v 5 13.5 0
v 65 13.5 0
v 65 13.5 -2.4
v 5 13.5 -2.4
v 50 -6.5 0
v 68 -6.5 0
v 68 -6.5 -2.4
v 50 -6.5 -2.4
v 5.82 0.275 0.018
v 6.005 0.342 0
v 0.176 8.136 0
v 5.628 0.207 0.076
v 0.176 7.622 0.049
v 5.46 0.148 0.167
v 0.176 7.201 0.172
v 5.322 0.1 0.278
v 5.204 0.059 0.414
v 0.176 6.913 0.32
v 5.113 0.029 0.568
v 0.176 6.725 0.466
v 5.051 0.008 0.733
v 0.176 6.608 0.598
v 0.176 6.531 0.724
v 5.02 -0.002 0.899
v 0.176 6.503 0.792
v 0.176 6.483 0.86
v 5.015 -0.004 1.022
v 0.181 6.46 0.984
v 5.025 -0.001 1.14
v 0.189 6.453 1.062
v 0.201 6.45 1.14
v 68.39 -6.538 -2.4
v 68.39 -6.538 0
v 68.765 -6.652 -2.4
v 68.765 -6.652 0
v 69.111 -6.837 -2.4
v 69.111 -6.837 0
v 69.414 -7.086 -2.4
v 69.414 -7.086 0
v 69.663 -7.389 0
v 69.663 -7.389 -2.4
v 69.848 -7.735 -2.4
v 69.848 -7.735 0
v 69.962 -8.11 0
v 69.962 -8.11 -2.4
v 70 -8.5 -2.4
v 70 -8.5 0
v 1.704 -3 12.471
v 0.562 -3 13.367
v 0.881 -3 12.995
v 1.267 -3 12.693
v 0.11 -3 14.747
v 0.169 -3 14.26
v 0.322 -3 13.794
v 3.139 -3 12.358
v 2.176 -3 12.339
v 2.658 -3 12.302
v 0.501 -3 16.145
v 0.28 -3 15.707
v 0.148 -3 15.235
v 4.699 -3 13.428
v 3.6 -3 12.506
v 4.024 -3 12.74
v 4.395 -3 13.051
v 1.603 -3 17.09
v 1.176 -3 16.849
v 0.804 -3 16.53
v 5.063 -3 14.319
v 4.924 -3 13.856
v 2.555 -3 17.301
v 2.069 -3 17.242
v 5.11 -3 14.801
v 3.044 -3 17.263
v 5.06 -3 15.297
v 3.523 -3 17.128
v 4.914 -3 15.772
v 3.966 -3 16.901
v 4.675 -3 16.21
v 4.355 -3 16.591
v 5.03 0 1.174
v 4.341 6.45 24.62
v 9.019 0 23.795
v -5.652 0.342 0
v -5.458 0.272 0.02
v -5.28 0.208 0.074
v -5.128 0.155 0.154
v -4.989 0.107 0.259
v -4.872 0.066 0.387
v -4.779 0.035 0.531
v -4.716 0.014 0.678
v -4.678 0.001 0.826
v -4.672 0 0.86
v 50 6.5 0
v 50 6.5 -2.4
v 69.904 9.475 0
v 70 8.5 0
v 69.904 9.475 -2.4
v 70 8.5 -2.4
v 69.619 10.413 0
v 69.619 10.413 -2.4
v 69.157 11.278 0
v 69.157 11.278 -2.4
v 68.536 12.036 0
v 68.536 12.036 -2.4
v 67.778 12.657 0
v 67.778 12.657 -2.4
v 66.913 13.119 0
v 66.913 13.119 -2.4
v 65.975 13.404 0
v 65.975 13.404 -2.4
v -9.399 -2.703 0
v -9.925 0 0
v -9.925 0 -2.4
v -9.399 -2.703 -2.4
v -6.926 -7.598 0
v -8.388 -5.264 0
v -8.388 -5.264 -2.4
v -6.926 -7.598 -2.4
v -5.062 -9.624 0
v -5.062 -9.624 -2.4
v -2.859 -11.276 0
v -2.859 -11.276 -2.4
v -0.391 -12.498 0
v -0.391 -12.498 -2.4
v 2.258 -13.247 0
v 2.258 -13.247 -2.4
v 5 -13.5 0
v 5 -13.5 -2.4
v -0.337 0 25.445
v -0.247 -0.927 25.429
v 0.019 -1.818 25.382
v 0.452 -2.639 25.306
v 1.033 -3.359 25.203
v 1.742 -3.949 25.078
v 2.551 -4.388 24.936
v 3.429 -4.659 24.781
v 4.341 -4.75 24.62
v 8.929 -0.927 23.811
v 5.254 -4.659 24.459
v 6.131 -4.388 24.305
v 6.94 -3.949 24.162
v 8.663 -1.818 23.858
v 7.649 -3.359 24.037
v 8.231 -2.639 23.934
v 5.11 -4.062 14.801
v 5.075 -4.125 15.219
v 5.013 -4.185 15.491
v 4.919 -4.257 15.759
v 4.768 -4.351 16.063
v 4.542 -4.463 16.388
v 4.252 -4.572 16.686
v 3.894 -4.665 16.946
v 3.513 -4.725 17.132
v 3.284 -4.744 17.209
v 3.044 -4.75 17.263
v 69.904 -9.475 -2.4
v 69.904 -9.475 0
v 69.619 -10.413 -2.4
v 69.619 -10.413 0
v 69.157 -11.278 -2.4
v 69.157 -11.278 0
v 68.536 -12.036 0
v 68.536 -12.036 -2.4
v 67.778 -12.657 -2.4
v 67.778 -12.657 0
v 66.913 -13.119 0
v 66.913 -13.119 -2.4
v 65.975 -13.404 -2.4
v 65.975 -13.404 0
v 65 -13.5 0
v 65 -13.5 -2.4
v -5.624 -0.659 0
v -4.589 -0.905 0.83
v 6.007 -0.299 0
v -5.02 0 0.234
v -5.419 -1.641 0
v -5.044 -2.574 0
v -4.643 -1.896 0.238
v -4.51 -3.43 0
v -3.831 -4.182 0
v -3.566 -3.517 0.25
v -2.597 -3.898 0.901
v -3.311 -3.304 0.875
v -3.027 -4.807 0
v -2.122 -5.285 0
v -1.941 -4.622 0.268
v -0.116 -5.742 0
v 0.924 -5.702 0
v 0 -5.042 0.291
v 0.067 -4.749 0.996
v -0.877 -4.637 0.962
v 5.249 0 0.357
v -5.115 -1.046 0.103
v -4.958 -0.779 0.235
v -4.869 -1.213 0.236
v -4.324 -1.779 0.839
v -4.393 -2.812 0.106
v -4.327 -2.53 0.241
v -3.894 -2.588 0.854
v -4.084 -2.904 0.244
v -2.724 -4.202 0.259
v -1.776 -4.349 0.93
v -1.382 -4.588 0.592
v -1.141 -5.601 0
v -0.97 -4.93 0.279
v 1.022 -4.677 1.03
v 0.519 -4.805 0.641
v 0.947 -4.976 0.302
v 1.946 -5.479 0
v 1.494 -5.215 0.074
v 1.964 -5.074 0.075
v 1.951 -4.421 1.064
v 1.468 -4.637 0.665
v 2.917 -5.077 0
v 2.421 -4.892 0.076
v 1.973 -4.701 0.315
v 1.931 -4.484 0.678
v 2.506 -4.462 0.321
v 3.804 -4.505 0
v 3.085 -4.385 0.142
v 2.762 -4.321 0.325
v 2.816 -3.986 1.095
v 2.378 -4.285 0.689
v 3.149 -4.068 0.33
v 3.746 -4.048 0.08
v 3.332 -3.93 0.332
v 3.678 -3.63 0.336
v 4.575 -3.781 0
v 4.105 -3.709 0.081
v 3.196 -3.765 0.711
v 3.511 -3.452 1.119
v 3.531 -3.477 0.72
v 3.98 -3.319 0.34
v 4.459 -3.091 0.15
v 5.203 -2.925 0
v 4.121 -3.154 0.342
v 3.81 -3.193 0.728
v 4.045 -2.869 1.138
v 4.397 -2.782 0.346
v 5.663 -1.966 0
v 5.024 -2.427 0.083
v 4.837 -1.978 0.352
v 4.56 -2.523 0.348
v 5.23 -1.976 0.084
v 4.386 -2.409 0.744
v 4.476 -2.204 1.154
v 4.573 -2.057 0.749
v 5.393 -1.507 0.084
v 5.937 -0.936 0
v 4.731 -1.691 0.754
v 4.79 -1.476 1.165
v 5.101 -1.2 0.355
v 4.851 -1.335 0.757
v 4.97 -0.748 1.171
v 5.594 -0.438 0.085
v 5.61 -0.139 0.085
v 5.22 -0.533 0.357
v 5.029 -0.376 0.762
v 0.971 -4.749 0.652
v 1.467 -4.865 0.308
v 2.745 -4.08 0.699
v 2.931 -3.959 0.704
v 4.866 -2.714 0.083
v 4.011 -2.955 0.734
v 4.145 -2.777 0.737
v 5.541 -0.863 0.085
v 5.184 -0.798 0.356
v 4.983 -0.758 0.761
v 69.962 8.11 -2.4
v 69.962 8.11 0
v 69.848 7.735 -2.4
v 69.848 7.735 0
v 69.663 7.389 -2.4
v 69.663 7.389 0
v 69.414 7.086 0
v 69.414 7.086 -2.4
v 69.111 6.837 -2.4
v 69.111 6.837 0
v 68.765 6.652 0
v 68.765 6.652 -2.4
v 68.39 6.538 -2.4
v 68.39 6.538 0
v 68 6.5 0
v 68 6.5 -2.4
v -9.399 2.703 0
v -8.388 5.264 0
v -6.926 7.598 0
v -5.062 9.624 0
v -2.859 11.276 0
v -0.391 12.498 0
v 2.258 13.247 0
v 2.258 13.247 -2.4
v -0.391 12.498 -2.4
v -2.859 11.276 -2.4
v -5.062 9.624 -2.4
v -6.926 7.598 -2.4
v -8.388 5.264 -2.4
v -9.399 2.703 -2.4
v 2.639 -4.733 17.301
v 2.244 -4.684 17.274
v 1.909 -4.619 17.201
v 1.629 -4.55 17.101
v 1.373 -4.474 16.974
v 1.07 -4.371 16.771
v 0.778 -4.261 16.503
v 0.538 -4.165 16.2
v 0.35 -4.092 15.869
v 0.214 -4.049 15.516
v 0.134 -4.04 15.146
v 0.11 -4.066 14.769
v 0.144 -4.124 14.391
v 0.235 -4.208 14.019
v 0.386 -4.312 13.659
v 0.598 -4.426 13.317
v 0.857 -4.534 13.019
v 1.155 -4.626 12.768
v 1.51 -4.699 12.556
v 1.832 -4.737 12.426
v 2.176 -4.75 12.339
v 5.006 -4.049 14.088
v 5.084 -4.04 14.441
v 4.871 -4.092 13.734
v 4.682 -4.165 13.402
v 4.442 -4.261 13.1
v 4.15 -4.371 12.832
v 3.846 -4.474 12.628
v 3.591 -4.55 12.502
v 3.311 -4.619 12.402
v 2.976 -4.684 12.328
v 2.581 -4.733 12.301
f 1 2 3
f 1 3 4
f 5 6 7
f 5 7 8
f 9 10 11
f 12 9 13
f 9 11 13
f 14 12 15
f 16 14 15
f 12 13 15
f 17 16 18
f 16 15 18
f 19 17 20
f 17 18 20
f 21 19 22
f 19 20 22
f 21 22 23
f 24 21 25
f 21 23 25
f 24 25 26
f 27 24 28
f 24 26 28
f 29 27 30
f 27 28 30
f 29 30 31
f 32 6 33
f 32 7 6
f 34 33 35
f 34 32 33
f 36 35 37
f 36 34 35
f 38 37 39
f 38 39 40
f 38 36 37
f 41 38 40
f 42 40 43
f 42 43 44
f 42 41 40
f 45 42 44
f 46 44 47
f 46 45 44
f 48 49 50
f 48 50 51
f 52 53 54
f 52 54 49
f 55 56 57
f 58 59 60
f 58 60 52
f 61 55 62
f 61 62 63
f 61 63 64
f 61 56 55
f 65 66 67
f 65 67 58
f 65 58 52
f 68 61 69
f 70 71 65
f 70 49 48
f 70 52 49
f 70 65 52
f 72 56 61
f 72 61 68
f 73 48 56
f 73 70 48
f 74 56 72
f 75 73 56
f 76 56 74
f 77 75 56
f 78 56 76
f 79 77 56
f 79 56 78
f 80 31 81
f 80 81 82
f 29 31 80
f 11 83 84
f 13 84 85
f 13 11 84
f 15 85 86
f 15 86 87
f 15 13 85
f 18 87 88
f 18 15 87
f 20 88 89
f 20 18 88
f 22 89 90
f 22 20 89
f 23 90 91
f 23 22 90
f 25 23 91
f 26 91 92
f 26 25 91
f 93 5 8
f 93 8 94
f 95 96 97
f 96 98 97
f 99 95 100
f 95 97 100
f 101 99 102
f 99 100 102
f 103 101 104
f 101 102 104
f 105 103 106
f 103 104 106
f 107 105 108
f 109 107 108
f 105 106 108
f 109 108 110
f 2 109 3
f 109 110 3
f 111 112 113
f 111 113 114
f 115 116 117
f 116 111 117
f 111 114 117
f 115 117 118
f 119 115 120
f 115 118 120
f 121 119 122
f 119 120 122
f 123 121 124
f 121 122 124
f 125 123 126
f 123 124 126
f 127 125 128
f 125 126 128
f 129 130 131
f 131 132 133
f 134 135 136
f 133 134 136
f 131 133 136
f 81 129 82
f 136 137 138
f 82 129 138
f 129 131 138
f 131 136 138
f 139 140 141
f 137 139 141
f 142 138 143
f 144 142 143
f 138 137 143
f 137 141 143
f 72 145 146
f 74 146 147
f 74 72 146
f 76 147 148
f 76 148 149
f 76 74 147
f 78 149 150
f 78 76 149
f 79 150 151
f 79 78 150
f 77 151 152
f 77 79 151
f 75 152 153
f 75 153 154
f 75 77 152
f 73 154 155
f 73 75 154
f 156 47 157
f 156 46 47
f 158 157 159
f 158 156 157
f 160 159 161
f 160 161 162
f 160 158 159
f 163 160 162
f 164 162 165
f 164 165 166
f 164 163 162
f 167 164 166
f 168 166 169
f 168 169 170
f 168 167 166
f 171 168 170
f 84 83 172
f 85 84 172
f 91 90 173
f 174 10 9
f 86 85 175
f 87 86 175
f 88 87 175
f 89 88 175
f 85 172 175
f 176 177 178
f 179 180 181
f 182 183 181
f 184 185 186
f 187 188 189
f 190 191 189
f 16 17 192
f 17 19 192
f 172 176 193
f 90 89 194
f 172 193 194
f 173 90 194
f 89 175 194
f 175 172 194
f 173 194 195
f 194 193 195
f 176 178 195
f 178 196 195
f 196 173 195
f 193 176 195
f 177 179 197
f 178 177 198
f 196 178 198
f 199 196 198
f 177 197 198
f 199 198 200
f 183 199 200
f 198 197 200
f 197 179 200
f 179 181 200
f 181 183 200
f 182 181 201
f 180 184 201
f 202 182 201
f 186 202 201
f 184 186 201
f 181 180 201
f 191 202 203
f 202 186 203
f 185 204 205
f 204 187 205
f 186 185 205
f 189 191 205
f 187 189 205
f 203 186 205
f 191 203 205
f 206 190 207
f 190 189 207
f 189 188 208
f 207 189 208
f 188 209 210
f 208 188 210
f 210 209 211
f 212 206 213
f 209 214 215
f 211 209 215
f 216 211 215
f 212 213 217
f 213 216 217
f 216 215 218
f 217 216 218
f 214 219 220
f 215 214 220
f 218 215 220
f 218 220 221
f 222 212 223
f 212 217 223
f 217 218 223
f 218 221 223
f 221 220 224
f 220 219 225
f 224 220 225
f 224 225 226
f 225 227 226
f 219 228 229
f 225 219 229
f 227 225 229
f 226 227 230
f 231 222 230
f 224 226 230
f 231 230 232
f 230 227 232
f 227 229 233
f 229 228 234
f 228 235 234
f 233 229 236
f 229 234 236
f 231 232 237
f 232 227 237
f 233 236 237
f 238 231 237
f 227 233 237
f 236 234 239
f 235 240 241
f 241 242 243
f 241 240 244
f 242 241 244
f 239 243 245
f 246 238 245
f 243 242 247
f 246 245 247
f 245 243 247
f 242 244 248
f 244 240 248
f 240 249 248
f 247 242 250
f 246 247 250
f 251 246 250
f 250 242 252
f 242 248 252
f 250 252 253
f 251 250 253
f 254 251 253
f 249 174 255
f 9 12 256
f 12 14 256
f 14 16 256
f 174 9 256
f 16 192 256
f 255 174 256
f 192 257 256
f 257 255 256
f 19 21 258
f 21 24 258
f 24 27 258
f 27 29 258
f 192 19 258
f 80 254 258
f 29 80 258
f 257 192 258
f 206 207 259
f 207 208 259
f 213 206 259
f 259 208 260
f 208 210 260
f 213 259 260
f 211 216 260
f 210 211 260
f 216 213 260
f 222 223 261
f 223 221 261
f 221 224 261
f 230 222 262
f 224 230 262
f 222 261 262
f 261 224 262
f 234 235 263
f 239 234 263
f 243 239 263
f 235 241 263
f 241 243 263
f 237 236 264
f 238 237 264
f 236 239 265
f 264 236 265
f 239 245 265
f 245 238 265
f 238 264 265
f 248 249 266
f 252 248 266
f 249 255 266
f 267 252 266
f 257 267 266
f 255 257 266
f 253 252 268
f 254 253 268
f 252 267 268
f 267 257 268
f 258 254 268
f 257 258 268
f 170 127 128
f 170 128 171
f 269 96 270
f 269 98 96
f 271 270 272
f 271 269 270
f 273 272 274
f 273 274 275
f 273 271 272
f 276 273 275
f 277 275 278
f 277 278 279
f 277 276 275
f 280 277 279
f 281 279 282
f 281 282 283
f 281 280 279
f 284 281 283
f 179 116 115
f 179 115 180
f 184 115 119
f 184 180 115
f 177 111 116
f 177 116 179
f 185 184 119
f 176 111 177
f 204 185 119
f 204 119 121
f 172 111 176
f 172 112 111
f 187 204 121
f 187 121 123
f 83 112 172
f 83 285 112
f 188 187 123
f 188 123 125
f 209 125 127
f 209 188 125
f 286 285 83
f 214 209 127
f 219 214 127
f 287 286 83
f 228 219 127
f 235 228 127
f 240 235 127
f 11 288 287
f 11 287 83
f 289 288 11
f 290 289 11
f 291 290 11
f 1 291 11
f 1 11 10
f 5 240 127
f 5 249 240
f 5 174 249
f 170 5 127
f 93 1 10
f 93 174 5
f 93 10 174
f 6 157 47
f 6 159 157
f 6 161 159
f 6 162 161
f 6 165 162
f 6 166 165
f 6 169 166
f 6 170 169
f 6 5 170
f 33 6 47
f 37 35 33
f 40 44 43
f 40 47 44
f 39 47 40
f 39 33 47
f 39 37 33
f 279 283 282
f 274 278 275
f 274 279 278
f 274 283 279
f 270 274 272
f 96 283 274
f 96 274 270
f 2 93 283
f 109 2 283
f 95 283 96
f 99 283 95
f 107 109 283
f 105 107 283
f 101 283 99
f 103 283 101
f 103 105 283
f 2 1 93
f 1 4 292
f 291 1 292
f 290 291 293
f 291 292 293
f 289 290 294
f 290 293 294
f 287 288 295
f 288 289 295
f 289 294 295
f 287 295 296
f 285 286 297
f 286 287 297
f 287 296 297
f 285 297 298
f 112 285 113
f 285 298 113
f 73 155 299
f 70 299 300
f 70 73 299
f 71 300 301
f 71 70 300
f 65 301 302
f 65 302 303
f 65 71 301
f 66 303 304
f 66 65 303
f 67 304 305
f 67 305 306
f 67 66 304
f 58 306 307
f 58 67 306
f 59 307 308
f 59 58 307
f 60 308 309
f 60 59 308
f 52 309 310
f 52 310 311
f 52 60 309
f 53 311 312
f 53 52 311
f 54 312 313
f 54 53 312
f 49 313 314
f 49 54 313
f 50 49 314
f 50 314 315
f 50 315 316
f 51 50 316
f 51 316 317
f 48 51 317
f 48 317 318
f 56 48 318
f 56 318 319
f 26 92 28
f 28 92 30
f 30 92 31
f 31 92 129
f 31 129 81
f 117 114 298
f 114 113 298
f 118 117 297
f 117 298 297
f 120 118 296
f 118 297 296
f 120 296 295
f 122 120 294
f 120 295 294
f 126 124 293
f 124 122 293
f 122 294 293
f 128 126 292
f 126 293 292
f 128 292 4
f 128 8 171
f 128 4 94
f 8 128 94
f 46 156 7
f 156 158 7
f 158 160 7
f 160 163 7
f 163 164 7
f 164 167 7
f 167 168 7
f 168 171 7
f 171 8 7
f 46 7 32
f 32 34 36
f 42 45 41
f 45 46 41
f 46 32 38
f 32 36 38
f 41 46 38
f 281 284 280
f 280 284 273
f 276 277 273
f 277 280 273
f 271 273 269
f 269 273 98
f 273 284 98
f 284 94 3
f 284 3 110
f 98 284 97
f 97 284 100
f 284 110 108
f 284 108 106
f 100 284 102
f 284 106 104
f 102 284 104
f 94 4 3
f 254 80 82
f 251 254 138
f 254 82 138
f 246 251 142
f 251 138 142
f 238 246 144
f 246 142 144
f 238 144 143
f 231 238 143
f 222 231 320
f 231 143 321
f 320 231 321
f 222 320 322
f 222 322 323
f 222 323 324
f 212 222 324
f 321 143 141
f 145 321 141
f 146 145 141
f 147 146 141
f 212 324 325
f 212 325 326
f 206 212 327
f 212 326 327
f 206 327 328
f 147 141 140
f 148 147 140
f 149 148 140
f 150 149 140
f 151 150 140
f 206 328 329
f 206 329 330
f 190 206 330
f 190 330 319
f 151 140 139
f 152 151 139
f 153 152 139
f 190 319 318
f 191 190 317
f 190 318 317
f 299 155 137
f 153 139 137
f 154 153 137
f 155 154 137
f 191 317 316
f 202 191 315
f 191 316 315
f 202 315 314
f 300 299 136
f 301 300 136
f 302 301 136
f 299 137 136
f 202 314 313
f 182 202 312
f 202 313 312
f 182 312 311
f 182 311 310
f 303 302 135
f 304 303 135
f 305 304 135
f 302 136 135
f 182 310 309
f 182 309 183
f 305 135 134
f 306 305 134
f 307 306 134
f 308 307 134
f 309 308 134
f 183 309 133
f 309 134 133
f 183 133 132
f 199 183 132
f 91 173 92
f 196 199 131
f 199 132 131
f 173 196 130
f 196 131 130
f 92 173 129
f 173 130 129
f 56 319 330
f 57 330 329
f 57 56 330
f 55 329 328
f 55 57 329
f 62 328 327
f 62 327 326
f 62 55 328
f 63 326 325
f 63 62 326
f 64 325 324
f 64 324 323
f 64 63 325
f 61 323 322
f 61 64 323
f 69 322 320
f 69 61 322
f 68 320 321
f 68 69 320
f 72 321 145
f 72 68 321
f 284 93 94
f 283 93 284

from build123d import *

# Parameters (mm, degrees)
F1_DEPTH      = 2.4
F4_DEPTH      = 25
F4_DEPTH_BACK = 1
F5_R          = 5
F6_T1_DEPTH   = 77.4
F7_R          = 1
F8_R          = 1.99999
F10_START     = 3
F10_DEPTH     = 22


# Not quite as in the source:
# - a fillet or chamfer that OpenCascade refuses, or shapes differently, is made with other operations: its cross-section is extruded or revolved along the edge and cut away or added
# - a fillet or chamfer is up to 0.001 mm smaller than in the source, because OpenCascade refuses the exact size


with BuildPart() as f1:
    # F0 (on Top) → F1 (new body)
    with BuildSketch(Plane.XY):
        Polygon((70, 13.5), (-10, 13.5), (-10, -13.5), (70, -13.5), (70, -6.5), (50, -6.5), (50, 6.5), (70, 6.5), align=None)
        with BuildLine():
            ThreePointArc((4.75, 0), (0, -4.75), (-4.75, 0))
            Line((-4.75, 0), (0, 6.45))
            Line((0, 6.45), (4.75, 0))
        make_face(mode=Mode.SUBTRACT)
        with BuildLine():
            Line((0, 6.45), (-4.75, 0))
            ThreePointArc((-4.75, 0), (0, -4.75), (4.75, 0))
            Line((4.75, 0), (0, 6.45))
        make_face()
    extrude(amount=-F1_DEPTH)

    # F3 (on line) → F4 (join, two sides)
    with BuildSketch(Plane(origin=(0, 0, 0), x_dir=(0.984807753, 0, -0.1736481777), z_dir=(-0.1736481777, 0, -0.984807753))) as f4_sk:
        with BuildLine():
            ThreePointArc((4.75, 0), (0, 4.75), (-4.75, 0))
            Line((-4.75, 0), (0, -6.45))
            Line((0, -6.45), (4.75, 0))
        make_face()
    extrude(amount=-F4_DEPTH)
    extrude(f4_sk.sketch, amount=F4_DEPTH_BACK)

    # F5
    f5_edges = [f1.edges().sort_by_distance(p)[0] for p in [
        (70, -13.5, -1.2),
        (70, 13.5, -1.2),
    ]]
    fillet(f5_edges, radius=F5_R)

    # F6: fillet of radius 15 on 2 edges, made by hand

    # F6_s2 → F6_t1 (cut)
    with BuildSketch(Plane.XY.offset(-39.9)):
        with BuildLine():
            ThreePointArc((-10, 1.5), (-5.6066017178, -9.1066017178), (5, -13.5))
            Line((5, -13.5), (-10, -13.5))
            Line((-10, -13.5), (-10, 1.5))
        make_face()
        with BuildLine():
            ThreePointArc((5, 13.5), (-5.6066017178, 9.1066017178), (-10, -1.5))
            Line((-10, -1.5), (-10, 13.5))
            Line((-10, 13.5), (5, 13.5))
        make_face()
    extrude(amount=F6_T1_DEPTH, mode=Mode.SUBTRACT)

    # F7
    f7_edges = [f1.edges().sort_by_distance(p)[0] for p in [
        (0, -4.75, 0),
        (-2.411638, 3.225, 0),
        (2.411638, 3.225, 0),
    ]]
    fillet(f7_edges, radius=F7_R)

    # F8 (radius 2 in the source; OpenCascade refuses exactly that, so slightly less here)
    f8_edges = [f1.edges().sort_by_distance(p)[0] for p in [
        (70, 6.5, -1.2),
        (70, -6.5, -1.2),
    ]]
    fillet(f8_edges, radius=F8_R)

    # F9 (on Front) → F10 (cut)
    with BuildSketch(Plane.XZ.offset(F10_START)):
        with BuildLine():
            ThreePointArc((2.1757445863, 12.3392607162), (4.2168340546, 12.8861689909), (5.1098650304, 14.8012800987))
            ThreePointArc((5.1098650304, 14.8012800987), (4.5249761382, 16.4082491229), (3.0439854746, 17.2632994812))
            Line((3.0439854746, 17.2632994812), (2.1757445863, 12.3392607162))
        make_face()
        with BuildLine():
            Line((2.1757445863, 12.3392607162), (3.0439854746, 17.2632994812))
            ThreePointArc((3.0439854746, 17.2632994812), (0.1478456479, 15.2354005429), (2.1757445863, 12.3392607162))
        make_face()
    extrude(amount=F10_DEPTH, mode=Mode.SUBTRACT)


solid = f1.part
